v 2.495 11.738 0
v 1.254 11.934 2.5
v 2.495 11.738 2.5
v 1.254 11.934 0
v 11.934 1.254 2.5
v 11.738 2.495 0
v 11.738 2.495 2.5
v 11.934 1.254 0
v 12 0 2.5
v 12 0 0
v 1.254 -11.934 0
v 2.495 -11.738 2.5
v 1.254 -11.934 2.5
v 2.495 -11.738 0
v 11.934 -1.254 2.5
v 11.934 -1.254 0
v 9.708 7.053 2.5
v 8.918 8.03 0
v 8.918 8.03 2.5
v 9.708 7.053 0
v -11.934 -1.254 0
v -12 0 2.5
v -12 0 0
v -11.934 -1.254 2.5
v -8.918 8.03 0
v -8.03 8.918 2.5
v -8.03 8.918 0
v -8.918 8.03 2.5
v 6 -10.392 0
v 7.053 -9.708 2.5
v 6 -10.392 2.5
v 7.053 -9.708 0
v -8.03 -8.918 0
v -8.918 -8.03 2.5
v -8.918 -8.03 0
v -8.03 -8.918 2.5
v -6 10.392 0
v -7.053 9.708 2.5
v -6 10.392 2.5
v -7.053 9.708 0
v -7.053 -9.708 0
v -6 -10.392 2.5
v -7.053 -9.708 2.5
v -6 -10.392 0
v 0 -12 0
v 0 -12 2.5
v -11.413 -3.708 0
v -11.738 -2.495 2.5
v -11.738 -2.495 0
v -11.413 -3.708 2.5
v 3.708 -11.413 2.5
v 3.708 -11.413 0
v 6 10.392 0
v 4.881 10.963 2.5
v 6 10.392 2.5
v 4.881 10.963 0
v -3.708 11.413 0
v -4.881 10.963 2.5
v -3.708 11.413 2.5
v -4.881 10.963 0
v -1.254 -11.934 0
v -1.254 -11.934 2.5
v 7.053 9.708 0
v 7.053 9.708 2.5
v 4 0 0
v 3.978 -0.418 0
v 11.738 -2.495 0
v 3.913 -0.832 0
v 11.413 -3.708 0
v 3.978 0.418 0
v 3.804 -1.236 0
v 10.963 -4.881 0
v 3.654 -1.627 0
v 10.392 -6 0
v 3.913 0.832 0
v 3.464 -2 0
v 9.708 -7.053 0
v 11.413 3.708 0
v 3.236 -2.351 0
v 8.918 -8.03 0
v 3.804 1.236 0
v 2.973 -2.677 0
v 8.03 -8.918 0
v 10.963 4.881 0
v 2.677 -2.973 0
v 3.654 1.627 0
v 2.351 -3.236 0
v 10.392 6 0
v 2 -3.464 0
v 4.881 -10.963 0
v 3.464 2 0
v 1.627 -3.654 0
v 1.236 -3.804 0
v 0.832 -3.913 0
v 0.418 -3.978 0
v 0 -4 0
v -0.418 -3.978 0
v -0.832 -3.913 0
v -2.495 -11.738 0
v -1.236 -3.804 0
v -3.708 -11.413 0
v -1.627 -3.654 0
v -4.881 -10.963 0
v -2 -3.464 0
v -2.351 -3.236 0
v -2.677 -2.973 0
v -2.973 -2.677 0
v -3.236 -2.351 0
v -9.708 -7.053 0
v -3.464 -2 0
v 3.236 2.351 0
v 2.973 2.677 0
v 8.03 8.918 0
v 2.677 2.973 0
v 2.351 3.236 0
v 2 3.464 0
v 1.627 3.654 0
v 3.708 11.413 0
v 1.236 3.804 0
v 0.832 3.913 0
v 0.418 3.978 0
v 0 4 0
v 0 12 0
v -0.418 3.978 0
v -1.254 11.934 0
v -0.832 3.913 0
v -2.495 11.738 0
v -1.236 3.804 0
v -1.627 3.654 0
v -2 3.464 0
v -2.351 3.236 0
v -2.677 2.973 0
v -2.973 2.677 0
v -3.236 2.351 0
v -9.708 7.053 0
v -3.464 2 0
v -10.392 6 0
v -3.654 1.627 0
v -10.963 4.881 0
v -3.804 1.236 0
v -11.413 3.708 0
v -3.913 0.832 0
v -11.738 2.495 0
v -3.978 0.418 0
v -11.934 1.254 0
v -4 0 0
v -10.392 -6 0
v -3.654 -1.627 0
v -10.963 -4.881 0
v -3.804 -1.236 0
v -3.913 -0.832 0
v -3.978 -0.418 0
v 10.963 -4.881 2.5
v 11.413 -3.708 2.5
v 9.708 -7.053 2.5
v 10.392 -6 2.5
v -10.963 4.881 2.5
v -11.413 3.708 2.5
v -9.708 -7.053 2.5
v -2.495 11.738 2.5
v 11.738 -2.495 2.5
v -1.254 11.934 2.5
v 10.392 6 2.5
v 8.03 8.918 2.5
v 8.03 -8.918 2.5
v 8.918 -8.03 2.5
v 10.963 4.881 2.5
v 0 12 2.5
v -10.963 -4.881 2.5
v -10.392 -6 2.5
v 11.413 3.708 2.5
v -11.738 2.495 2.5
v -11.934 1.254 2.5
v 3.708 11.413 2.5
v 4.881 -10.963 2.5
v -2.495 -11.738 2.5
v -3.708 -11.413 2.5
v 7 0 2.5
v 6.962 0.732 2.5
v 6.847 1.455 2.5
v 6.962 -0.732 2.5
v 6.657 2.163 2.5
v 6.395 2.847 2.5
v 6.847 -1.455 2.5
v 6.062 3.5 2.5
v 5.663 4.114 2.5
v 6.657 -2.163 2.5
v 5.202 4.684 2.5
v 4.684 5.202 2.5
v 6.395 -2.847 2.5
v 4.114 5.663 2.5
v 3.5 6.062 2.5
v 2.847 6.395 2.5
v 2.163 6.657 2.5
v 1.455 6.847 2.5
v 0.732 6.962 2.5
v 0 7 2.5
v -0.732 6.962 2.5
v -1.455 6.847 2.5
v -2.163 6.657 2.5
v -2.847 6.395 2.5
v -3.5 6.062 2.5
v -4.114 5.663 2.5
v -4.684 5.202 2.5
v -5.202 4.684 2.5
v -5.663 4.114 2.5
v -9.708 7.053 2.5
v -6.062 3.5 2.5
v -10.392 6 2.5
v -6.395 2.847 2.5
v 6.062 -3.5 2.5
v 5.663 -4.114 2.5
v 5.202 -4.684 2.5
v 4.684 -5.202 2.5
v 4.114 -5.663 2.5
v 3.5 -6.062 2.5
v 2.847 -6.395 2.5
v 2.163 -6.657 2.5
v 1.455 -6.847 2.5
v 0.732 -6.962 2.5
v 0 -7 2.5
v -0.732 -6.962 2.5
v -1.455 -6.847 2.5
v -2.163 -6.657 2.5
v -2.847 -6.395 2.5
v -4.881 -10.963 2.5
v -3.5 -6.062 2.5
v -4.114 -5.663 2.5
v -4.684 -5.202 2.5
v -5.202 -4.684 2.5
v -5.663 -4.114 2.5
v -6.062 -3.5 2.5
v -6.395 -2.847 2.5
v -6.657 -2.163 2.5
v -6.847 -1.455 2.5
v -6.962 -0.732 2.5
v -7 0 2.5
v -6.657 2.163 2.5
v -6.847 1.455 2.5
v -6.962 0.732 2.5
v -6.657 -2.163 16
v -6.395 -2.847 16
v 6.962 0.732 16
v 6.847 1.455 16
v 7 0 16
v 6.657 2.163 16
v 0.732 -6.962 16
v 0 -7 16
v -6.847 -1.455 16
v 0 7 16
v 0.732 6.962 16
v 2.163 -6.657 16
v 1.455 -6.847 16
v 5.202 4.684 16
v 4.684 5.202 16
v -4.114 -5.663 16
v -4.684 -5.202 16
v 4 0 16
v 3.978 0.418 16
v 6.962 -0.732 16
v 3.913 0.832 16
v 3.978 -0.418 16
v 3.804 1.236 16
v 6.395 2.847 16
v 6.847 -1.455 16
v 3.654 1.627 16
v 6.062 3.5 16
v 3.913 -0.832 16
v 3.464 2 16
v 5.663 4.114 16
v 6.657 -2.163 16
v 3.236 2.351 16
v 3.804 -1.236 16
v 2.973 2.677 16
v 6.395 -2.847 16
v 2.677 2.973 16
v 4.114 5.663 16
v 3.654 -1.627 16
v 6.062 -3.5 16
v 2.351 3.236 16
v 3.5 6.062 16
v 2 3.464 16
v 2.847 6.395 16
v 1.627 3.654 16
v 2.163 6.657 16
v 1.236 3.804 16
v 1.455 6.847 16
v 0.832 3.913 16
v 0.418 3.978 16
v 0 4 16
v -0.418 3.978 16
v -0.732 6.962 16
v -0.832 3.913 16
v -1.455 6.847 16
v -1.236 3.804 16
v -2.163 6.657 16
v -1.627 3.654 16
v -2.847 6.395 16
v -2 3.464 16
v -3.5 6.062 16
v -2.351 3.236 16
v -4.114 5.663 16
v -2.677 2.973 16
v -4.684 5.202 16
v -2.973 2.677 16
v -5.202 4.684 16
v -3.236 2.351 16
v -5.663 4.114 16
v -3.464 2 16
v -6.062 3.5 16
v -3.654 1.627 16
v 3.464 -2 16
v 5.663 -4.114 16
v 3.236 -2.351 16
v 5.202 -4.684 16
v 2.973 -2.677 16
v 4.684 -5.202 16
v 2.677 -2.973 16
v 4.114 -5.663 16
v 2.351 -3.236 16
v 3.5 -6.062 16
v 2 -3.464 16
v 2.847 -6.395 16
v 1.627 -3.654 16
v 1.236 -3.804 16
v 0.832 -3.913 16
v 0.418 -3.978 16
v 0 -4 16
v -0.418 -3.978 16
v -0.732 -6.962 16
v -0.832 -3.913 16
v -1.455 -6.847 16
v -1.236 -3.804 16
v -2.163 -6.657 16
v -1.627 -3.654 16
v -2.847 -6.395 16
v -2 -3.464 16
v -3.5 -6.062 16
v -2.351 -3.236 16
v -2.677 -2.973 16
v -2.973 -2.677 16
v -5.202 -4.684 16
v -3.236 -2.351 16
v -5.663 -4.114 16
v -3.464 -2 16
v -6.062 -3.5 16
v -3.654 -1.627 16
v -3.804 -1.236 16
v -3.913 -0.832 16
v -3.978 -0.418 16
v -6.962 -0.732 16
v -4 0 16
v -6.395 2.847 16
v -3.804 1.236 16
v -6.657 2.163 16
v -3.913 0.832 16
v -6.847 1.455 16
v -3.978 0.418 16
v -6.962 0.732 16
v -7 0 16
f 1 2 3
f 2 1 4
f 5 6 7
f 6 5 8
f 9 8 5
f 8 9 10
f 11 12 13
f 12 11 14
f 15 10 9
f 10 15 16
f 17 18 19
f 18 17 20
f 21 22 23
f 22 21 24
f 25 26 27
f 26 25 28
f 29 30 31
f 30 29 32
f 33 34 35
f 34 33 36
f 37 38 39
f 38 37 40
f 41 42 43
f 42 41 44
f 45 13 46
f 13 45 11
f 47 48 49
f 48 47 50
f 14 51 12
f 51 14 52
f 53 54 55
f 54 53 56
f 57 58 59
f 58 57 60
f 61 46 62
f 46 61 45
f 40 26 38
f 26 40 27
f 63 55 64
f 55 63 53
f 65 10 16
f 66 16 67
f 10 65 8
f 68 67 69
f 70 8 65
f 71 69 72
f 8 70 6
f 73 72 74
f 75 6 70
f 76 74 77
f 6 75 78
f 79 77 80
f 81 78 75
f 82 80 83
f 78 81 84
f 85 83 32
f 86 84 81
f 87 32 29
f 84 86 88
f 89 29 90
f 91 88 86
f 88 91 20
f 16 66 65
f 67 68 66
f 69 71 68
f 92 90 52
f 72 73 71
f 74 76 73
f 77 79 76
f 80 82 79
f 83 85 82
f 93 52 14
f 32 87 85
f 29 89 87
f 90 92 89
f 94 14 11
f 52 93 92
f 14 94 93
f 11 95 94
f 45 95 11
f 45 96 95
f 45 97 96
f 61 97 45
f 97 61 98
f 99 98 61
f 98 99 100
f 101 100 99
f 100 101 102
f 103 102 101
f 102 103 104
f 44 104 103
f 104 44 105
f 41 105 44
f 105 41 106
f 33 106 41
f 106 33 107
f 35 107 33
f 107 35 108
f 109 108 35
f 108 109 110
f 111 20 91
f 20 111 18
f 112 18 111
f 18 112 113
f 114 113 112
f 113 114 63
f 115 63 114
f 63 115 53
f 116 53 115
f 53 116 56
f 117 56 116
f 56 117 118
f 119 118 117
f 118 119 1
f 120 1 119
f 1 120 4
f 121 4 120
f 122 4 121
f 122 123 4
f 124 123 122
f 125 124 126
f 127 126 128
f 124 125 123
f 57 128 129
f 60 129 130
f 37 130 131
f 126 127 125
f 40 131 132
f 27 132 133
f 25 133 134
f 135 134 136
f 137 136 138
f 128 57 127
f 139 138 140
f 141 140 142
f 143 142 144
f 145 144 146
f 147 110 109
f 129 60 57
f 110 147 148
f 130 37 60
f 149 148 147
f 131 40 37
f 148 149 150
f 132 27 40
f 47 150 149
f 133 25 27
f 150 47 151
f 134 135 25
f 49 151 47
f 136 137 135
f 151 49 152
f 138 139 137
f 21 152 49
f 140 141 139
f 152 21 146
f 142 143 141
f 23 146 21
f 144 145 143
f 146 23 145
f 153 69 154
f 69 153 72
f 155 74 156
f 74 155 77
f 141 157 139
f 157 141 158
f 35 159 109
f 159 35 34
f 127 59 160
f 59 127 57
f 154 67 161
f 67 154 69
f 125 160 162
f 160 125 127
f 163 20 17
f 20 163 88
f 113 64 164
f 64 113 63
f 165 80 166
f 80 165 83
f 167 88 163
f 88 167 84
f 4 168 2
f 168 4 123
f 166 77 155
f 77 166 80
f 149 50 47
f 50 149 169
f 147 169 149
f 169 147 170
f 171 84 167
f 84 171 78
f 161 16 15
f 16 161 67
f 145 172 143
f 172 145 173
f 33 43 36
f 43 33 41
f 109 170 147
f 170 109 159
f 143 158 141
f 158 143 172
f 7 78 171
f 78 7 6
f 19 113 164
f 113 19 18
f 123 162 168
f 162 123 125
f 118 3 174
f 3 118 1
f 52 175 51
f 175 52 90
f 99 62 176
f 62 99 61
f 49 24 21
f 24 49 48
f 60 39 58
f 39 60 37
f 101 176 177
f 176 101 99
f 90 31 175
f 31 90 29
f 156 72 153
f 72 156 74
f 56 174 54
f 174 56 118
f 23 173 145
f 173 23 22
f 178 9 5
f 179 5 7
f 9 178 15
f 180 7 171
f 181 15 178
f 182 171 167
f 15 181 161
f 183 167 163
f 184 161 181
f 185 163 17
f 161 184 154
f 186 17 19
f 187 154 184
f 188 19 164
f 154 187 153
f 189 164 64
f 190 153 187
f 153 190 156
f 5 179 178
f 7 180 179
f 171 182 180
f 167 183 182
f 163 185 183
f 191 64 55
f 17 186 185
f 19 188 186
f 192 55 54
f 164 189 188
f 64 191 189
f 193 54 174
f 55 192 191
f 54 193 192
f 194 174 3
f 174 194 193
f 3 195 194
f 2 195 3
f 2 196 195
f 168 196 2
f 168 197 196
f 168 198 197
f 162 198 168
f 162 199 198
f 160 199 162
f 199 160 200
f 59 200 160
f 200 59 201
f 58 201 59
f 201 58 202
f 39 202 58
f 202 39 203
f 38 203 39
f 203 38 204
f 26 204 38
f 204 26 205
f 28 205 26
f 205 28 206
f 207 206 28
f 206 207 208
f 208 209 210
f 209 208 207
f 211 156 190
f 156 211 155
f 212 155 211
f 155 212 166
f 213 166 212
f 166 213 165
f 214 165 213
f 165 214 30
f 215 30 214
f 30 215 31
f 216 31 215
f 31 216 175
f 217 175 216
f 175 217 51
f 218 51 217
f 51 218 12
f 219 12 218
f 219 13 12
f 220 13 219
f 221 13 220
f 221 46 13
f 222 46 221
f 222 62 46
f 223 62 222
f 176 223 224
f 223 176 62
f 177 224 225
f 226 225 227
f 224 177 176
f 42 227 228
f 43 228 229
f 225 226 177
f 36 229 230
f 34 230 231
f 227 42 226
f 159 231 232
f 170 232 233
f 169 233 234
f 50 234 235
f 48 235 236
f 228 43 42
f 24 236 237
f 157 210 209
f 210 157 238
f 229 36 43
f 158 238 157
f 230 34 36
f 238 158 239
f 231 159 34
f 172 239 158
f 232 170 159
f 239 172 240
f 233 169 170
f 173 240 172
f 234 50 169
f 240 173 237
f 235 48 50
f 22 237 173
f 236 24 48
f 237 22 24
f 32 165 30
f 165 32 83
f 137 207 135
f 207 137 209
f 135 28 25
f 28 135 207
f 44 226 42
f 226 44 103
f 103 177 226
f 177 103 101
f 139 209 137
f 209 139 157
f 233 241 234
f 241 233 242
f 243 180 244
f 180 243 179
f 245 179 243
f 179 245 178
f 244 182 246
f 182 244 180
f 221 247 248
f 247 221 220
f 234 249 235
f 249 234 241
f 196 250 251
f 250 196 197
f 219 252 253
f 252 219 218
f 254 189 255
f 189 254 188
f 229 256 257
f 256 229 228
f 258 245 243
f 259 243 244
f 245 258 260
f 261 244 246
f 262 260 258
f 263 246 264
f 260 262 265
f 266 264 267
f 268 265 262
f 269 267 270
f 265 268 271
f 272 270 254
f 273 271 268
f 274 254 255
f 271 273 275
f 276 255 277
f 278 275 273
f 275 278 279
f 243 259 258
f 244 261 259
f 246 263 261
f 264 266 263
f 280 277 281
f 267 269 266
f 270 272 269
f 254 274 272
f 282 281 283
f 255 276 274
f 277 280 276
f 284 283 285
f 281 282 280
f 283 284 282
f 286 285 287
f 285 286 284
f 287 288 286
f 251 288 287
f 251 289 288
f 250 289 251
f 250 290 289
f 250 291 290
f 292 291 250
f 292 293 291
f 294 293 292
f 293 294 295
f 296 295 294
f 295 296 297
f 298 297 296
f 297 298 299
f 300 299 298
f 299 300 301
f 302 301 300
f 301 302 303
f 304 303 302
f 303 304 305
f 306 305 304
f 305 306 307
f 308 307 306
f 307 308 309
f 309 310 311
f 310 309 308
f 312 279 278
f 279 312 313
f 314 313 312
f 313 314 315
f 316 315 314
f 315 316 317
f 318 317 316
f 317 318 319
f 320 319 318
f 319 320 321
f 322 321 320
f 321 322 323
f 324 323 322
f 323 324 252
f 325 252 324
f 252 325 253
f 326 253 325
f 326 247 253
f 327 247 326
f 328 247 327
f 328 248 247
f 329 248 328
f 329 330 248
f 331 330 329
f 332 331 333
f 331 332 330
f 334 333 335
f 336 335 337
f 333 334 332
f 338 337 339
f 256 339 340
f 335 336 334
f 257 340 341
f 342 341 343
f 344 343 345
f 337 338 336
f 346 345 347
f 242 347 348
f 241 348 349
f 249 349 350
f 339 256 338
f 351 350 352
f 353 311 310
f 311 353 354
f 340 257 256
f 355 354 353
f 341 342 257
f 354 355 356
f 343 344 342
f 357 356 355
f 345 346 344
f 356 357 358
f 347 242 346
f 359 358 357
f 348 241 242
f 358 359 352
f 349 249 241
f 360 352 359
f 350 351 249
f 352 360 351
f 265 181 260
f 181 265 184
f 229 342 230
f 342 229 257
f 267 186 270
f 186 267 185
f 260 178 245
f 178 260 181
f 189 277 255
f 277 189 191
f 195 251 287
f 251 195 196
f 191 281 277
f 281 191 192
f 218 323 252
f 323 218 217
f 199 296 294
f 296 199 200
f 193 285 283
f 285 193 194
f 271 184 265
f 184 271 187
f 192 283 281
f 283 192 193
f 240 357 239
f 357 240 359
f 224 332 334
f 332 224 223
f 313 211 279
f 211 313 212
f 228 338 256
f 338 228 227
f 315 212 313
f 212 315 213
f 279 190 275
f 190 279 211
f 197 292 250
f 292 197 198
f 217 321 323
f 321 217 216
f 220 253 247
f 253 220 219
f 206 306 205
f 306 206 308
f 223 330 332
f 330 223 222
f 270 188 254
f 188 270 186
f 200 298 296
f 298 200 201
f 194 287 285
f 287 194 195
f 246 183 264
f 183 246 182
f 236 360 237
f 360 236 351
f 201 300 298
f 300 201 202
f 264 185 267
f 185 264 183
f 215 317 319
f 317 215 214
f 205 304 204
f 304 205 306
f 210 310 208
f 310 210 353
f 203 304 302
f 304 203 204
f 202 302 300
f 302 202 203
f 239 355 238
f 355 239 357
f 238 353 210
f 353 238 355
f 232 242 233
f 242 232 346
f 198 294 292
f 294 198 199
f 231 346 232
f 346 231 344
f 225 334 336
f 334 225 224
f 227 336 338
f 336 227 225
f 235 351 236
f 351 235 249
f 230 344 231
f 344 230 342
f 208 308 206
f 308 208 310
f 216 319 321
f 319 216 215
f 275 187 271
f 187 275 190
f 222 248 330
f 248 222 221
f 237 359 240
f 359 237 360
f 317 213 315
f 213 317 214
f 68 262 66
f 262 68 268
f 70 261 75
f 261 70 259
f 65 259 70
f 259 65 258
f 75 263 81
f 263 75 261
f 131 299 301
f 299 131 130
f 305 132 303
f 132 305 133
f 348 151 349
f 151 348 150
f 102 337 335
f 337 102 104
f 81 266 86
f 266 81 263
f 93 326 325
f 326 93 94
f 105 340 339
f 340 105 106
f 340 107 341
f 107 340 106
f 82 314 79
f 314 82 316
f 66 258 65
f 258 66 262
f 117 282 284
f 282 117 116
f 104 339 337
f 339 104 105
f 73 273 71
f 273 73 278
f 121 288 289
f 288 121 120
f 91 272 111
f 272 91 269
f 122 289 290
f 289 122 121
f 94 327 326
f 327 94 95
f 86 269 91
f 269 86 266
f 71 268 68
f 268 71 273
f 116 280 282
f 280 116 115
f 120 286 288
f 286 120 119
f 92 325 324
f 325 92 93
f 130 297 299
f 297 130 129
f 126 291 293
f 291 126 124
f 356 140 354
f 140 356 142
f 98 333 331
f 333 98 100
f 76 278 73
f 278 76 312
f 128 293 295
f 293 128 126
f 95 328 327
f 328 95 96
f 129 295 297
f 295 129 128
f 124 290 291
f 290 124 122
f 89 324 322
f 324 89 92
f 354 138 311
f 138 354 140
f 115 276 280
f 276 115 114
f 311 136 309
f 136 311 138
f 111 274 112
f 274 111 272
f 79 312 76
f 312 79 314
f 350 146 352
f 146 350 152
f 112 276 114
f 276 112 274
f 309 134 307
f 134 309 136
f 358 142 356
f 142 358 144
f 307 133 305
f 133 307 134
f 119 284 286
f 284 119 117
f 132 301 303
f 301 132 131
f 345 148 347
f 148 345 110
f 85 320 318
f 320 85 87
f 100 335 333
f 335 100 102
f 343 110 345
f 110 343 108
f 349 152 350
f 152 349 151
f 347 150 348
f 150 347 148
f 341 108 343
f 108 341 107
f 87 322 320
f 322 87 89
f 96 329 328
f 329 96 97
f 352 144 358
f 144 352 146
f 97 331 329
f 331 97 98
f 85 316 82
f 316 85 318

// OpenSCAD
// Flanged sleeve bushing.
$fn = 60;
eps = 0.02;
inner_d = 8;
outer_d = 14;
length = 16;
flange_d = 24;
flange_t = 2.5;
difference() {
    union() {
        cylinder(d = flange_d, h = flange_t);
        cylinder(d = outer_d, h = length);
    }
    translate([0, 0, -eps]) cylinder(d = inner_d, h = length + 2 * eps);
}
